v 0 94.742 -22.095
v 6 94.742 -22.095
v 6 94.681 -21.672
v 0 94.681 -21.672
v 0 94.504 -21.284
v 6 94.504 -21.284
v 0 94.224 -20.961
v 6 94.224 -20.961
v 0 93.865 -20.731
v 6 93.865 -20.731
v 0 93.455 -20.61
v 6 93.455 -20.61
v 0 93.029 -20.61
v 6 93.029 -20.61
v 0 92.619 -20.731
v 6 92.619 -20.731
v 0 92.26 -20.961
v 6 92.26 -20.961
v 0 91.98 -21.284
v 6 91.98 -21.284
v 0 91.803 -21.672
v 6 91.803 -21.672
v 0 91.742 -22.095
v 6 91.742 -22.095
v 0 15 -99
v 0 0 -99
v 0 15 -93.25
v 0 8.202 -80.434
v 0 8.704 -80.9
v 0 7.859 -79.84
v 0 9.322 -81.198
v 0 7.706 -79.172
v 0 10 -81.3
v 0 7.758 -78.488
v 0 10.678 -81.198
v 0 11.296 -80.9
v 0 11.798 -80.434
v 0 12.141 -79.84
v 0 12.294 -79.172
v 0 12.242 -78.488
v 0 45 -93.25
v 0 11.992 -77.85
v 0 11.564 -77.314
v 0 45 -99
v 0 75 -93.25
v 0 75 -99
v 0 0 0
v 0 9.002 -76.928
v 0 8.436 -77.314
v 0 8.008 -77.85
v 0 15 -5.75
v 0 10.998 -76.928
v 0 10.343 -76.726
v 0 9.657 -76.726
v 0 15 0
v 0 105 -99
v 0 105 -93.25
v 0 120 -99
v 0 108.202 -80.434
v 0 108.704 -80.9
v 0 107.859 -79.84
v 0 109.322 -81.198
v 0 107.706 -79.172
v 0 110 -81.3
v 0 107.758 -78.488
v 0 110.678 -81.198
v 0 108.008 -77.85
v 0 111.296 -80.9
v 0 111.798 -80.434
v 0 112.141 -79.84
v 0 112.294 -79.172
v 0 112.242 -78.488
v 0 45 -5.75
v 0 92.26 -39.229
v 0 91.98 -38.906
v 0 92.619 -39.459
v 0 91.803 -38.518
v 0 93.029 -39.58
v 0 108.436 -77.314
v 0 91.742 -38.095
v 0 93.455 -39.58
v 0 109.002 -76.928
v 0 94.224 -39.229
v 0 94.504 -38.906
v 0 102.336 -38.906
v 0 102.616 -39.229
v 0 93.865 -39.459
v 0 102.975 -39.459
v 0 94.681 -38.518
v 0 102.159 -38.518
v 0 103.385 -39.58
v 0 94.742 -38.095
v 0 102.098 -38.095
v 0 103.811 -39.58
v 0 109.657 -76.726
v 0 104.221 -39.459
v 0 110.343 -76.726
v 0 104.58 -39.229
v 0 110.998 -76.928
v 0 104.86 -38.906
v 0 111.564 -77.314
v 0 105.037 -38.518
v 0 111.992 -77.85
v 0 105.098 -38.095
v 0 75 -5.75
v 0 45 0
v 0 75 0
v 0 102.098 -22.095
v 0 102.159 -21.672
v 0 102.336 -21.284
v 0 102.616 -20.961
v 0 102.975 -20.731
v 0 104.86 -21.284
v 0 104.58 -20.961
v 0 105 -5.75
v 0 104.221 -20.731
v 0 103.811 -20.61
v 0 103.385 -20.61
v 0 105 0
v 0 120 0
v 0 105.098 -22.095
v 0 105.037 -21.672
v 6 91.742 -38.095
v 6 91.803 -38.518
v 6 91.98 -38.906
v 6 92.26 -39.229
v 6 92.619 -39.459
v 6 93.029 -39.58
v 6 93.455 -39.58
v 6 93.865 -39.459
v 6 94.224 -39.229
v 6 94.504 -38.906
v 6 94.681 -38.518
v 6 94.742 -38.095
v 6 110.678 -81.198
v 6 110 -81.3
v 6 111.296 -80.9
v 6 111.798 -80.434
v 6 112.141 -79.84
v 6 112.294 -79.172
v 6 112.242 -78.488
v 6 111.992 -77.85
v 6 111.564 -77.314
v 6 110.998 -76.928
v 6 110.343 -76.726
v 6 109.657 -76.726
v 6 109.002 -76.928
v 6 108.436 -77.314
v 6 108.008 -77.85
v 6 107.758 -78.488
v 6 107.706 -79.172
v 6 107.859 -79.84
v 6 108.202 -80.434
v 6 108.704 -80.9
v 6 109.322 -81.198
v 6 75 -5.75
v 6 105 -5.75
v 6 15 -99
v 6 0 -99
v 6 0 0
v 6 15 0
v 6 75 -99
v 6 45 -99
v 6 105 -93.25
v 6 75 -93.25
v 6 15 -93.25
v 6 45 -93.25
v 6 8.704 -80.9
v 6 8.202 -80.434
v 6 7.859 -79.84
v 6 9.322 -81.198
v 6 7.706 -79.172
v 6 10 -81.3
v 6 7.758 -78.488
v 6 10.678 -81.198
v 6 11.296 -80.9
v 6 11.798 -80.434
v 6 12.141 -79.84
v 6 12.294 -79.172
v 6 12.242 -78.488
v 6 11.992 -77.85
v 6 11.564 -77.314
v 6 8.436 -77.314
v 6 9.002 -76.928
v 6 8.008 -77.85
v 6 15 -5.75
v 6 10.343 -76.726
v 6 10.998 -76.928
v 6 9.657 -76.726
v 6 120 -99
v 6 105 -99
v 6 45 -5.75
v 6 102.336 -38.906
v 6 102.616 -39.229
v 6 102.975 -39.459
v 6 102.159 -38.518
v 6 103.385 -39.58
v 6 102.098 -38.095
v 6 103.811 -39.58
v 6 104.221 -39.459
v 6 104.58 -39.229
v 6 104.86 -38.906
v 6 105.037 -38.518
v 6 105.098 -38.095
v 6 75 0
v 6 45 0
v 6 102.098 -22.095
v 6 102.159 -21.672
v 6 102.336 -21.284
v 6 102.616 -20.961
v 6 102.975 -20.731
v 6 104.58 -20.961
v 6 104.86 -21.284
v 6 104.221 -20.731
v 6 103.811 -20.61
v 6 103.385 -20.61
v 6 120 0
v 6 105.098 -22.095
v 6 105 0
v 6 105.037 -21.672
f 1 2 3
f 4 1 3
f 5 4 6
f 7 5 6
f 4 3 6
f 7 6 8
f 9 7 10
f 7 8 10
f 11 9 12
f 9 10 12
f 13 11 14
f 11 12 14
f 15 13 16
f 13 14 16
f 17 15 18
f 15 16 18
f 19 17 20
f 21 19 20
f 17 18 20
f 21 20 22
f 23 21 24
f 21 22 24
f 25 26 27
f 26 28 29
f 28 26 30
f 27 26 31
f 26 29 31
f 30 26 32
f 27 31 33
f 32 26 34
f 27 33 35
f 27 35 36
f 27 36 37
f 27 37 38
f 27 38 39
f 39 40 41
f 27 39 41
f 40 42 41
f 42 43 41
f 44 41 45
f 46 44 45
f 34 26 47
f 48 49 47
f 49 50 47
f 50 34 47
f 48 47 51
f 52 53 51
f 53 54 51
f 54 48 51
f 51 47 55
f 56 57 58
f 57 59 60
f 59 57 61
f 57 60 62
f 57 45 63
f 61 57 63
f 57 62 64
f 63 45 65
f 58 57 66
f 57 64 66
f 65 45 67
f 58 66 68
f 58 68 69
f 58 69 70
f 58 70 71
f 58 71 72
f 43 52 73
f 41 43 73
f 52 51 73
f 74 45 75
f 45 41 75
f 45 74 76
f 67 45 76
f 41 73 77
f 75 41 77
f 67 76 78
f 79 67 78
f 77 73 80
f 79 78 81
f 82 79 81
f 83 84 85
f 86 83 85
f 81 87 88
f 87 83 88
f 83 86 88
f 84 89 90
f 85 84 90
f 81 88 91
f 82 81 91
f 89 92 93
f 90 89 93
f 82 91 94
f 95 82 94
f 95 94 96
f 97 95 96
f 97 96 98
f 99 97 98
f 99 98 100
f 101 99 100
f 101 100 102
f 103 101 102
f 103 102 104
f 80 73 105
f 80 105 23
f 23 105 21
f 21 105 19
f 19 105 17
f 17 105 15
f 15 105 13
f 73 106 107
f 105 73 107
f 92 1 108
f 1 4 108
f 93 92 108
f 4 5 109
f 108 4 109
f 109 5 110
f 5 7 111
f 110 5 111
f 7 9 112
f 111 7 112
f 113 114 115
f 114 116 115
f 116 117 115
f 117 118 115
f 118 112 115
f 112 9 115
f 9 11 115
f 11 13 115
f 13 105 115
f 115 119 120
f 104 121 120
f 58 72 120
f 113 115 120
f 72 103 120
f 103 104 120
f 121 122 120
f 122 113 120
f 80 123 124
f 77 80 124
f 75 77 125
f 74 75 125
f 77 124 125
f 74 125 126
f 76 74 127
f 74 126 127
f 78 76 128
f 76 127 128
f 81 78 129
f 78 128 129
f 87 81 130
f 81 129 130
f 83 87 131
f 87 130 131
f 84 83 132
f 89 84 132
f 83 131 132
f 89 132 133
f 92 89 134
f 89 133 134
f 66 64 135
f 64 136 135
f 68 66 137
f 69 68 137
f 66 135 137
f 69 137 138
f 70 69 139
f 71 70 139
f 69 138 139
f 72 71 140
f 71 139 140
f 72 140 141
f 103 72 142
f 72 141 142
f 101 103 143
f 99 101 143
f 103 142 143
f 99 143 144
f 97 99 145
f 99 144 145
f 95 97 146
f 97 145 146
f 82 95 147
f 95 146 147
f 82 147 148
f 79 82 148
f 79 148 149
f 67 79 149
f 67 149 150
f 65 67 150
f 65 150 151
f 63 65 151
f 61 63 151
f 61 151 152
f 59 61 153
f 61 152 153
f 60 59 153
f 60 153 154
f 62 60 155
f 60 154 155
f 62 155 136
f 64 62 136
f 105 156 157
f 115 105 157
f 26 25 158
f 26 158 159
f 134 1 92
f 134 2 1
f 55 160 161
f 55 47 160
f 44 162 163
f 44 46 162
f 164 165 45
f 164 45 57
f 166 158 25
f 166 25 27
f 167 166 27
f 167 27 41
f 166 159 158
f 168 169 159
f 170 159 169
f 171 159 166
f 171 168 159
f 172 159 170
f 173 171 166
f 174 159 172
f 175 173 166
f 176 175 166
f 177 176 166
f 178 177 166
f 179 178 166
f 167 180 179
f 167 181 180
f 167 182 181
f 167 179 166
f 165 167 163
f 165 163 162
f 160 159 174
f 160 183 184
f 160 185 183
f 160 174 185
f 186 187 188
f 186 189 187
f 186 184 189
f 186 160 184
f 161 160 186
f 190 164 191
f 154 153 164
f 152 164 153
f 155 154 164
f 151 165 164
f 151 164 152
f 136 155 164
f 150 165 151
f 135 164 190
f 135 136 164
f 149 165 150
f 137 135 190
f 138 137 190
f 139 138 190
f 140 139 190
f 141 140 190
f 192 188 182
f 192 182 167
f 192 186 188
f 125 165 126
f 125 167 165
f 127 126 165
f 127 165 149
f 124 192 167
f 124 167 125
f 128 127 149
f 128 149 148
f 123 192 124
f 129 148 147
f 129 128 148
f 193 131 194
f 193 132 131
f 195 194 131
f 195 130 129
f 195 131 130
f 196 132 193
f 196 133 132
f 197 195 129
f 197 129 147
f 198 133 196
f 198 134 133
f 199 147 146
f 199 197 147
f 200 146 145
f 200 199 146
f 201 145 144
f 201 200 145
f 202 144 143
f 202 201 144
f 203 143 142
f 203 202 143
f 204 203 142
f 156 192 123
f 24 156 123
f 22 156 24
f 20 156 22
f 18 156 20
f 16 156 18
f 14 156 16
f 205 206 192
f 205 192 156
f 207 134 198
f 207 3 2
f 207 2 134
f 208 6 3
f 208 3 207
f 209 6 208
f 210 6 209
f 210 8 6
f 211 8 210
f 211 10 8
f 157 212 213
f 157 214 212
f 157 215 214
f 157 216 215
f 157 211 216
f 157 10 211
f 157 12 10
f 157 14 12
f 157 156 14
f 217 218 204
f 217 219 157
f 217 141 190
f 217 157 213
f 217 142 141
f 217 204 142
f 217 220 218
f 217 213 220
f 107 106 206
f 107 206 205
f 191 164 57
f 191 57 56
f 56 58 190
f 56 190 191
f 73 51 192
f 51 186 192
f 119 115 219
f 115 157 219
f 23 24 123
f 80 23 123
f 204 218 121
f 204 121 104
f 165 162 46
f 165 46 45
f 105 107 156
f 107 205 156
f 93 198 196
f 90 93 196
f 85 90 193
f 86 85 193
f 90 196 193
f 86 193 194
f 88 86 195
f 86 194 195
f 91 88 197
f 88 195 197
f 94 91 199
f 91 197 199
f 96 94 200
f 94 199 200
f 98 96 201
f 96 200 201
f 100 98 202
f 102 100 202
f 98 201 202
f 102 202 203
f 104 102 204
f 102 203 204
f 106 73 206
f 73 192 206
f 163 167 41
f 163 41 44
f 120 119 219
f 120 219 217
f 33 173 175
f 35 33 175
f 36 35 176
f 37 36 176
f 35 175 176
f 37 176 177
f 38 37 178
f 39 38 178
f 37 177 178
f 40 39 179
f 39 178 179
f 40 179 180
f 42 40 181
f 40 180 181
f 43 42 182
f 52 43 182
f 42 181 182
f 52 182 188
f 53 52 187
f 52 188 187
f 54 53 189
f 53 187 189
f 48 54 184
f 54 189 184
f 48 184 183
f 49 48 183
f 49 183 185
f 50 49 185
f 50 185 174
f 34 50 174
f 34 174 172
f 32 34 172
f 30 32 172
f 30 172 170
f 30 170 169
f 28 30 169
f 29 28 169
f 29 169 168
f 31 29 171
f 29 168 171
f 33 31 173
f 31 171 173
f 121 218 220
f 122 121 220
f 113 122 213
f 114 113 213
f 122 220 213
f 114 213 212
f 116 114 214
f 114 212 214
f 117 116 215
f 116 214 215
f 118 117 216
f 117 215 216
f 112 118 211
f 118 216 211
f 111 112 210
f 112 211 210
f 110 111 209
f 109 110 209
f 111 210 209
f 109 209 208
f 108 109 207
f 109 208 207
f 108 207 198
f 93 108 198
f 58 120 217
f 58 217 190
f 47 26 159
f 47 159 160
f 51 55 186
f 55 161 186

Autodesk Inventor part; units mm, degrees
ref_plane "YZ Plane" through (0, 0, 0) normal (1, 0, 0) x (0, 1, 0)
ref_plane "XZ Plane" through (0, 0, 0) normal (0, 1, 0) x (-1, 0, 0)
ref_plane "XY Plane" through (0, 0, 0) normal (0, 0, 1) x (1, 0, 0)
sketch "Sketch1" plane through (0, 0, 0) normal (1, 0, 0) x (0, 1, 0)
  line L0 (0, 0) -> (120, 0)
  line L1 (120, 0) -> (120, -99)
  line L2 (120, -99) -> (0, -99)
  line L3 (0, -99) -> (0, 0)
  dimension "d0" = 120
  dimension "d1" = 99
extrude "Extrusion1" add sketch "Sketch1" along normal blind 6
sketch "Sketch2" plane through (6, 0, 0) normal (1, 0, 0) x (0, 0, -1)
  line L0 (0, 120) -> (0, 0) projected
  line L1 (0, 0) -> (99, 0) projected
  line L2 (99, 0) -> (99, 120) projected
  line L3 (99, 120) -> (0, 120) projected
  line L4 (0, 120) -> (0, 0) projected
  line L5 (0, 15) -> (5.75, 15)
  line L6 (5.75, 15) -> (5.75, 45)
  line L7 (5.75, 45) -> (0, 45)
  line L8 (0, 45) -> (0, 15)
  line L9 (0, 75) -> (5.75, 75)
  line L10 (5.75, 75) -> (5.75, 105)
  line L11 (5.75, 105) -> (0, 105)
  line L12 (0, 105) -> (0, 75)
  line L13 (99, 15) -> (93.25, 15)
  line L14 (93.25, 15) -> (93.25, 45)
  line L15 (93.25, 45) -> (99, 45)
  line L16 (99, 45) -> (99, 15)
  line L17 (99, 75) -> (93.25, 75)
  line L18 (93.25, 75) -> (93.25, 105)
  line L19 (93.25, 105) -> (99, 105)
  line L20 (99, 105) -> (99, 75)
  line L21 (-12.0657, 60) -> (104.2665, 60)
  line L22 (99, 120) -> (0, 120) projected
  dimension "d5" = 5.75
  dimension "d6" = 5.75
  dimension "d8" = 30
  dimension "d9" = 30
  dimension "d22" = 60
  dimension "d23" = 15
  dimension "d24" = 15
extrude "Extrusion2" cut sketch "Sketch2" against normal up to next contours L11 L10 L9 L0 | L2 L17 L18 L19 | L7 L6 L5 L0 | L2 L13 L14 L15
sketch "Sketch3" plane through (6, 0, 0) normal (1, 0, 0) x (0, 0, -1)
  circle A0 centre (79, 10) radius 2.3
  circle A1 centre (79, 110) radius 2.3
  line L0 (99, 105) -> (99, 120) projected
  line L1 (99, 120) -> (0, 120) projected
  line L2 (99, 0) -> (99, 15) projected
  line L3 (0, 0) -> (99, 0) projected
  dimension "d13" = 20
  dimension "d14" = 10
  dimension "d15" = 4.6
  dimension "d17" = 10
  dimension "d18" = 20
  dimension "d19" = 4.6
extrude "Extrusion3" cut sketch "Sketch3" against normal up to next
sketch "Sketch4" plane through (6, 0, 0) normal (1, 0, 0) x (0, 0, -1)
  circle A0 centre (79, 10) radius 2.3 projected
  circle A1 centre (79, 110) radius 2.3 projected
  line L0 (5.75, 75) -> (0, 75) projected
  line L1 (0, 75) -> (0, 45) projected
  line L2 (0, 45) -> (5.75, 45) projected
  line L3 (5.75, 45) -> (5.75, 15) projected
  line L4 (5.75, 15) -> (0, 15) projected
  line L5 (0, 15) -> (0, 0) projected
  line L6 (0, 0) -> (99, 0) projected
  line L7 (99, 0) -> (99, 15) projected
  line L8 (99, 15) -> (93.25, 15) projected
  line L9 (93.25, 15) -> (93.25, 45) projected
  line L10 (93.25, 45) -> (99, 45) projected
  line L11 (99, 45) -> (99, 75) projected
  line L12 (99, 75) -> (93.25, 75) projected
  line L13 (93.25, 75) -> (93.25, 105) projected
  line L14 (93.25, 105) -> (99, 105) projected
  line L15 (99, 105) -> (99, 120) projected
  line L16 (99, 120) -> (0, 120) projected
  line L17 (0, 120) -> (0, 105) projected
  line L18 (0, 105) -> (5.75, 105) projected
  line L19 (5.75, 105) -> (5.75, 75) projected
  circle A2 centre (33.095, 103.598) radius 1.5 construction
  circle A3 centre (33.095, 93.242) radius 1.5 construction
  arc A4 (22.095, 105.098) -> (22.095, 102.098) centre (22.095, 103.598) ccw
  arc A5 (38.095, 102.098) -> (38.095, 105.098) centre (38.095, 103.598) ccw
  arc A6 (22.095, 94.742) -> (22.095, 91.742) centre (22.095, 93.242) ccw
  arc A7 (38.095, 91.742) -> (38.095, 94.742) centre (38.095, 93.242) ccw
  line L20 (22.095, 91.742) -> (38.095, 91.742)
  line L21 (22.095, 94.742) -> (38.095, 94.742)
  line L22 (22.095, 102.098) -> (38.095, 102.098)
  line L23 (22.095, 105.098) -> (38.095, 105.098)
  dimension "d25" = 3
  dimension "d26" = 3
  dimension "d27" = 10.356
  dimension "d28" = 16.402
  dimension "d29" = 65.905
  dimension "d30" = 3
  dimension "d31" = 3
  dimension "d32" = 3
  dimension "d33" = 3
  dimension "d34" = 16
  dimension "d35" = 16
  dimension "d36" = 11
  dimension "d37" = 11
extrude "Extrusion4" cut sketch "Sketch4" against normal blind 10 contours L23 A5 L22 A4 | L21 A7 L20 A6
equation "\"d26\" = d25"
equation "\"d30\" = d25"
equation "\"d31\" = d25"
equation "\"d32\" = d25"
equation "\"d33\" = d25"
properties part number "SideLeft"
